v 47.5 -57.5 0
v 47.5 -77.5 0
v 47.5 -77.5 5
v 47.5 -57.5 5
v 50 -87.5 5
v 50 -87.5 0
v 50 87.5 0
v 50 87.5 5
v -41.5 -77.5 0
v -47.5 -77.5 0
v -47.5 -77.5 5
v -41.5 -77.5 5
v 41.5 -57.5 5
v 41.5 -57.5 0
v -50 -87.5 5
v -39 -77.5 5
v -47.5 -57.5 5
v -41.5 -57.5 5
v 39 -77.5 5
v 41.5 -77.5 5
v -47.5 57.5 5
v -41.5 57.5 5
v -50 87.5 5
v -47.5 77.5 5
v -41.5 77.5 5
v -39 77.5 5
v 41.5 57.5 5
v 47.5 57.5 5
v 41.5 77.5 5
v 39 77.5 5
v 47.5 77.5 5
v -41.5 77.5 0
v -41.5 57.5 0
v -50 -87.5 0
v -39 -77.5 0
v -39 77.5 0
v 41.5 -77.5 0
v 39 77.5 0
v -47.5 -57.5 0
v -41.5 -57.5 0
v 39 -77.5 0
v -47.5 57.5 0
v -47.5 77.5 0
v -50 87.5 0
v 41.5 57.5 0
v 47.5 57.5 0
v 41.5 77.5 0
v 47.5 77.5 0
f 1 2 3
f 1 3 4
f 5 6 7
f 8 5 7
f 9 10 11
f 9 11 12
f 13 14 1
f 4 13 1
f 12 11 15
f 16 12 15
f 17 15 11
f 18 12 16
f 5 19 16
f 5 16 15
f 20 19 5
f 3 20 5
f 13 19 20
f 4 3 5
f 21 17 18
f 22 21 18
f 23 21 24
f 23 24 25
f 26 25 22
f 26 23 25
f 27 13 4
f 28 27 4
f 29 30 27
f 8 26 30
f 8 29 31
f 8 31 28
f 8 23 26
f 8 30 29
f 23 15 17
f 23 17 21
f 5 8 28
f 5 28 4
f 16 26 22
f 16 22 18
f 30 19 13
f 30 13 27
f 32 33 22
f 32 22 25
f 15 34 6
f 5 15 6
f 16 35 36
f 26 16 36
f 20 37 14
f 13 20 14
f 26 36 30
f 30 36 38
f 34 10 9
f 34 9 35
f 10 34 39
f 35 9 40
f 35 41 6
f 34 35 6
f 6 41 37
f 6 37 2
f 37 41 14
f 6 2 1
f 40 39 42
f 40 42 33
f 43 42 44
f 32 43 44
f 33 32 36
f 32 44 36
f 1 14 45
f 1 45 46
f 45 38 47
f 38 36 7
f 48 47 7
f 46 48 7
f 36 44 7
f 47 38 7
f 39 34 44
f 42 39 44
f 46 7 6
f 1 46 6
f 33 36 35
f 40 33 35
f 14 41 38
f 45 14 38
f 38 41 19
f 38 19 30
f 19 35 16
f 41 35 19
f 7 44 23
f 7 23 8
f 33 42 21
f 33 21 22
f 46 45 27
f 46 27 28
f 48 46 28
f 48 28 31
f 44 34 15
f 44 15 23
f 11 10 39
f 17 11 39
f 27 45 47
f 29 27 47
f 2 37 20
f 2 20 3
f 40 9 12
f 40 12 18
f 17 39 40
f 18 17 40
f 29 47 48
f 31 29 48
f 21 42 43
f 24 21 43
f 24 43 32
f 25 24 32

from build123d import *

# Parameters (mm, degrees)
F0_W     = 100
F0_H     = 175
F0_W_2   = 6
F0_H_2   = 20
F0_W_3   = 78
F0_H_3   = 155
F1_DEPTH = 5


with BuildPart() as f1:
    # F0 (on Top) → F1 (new body)
    with BuildSketch(Plane.XY):
        Rectangle(F0_W, F0_H)
        with Locations((-44.5, -67.5)):
            Rectangle(F0_W_2, F0_H_2, mode=Mode.SUBTRACT)
        with Locations((44.5, -67.5)):
            Rectangle(F0_W_2, F0_H_2, mode=Mode.SUBTRACT)
        with Locations((-44.5, 67.5)):
            Rectangle(F0_W_2, F0_H_2, mode=Mode.SUBTRACT)
        Rectangle(F0_W_3, F0_H_3, mode=Mode.SUBTRACT)
        with Locations((44.5, 67.5)):
            Rectangle(F0_W_2, F0_H_2, mode=Mode.SUBTRACT)
    extrude(amount=F1_DEPTH)


solid = f1.part
